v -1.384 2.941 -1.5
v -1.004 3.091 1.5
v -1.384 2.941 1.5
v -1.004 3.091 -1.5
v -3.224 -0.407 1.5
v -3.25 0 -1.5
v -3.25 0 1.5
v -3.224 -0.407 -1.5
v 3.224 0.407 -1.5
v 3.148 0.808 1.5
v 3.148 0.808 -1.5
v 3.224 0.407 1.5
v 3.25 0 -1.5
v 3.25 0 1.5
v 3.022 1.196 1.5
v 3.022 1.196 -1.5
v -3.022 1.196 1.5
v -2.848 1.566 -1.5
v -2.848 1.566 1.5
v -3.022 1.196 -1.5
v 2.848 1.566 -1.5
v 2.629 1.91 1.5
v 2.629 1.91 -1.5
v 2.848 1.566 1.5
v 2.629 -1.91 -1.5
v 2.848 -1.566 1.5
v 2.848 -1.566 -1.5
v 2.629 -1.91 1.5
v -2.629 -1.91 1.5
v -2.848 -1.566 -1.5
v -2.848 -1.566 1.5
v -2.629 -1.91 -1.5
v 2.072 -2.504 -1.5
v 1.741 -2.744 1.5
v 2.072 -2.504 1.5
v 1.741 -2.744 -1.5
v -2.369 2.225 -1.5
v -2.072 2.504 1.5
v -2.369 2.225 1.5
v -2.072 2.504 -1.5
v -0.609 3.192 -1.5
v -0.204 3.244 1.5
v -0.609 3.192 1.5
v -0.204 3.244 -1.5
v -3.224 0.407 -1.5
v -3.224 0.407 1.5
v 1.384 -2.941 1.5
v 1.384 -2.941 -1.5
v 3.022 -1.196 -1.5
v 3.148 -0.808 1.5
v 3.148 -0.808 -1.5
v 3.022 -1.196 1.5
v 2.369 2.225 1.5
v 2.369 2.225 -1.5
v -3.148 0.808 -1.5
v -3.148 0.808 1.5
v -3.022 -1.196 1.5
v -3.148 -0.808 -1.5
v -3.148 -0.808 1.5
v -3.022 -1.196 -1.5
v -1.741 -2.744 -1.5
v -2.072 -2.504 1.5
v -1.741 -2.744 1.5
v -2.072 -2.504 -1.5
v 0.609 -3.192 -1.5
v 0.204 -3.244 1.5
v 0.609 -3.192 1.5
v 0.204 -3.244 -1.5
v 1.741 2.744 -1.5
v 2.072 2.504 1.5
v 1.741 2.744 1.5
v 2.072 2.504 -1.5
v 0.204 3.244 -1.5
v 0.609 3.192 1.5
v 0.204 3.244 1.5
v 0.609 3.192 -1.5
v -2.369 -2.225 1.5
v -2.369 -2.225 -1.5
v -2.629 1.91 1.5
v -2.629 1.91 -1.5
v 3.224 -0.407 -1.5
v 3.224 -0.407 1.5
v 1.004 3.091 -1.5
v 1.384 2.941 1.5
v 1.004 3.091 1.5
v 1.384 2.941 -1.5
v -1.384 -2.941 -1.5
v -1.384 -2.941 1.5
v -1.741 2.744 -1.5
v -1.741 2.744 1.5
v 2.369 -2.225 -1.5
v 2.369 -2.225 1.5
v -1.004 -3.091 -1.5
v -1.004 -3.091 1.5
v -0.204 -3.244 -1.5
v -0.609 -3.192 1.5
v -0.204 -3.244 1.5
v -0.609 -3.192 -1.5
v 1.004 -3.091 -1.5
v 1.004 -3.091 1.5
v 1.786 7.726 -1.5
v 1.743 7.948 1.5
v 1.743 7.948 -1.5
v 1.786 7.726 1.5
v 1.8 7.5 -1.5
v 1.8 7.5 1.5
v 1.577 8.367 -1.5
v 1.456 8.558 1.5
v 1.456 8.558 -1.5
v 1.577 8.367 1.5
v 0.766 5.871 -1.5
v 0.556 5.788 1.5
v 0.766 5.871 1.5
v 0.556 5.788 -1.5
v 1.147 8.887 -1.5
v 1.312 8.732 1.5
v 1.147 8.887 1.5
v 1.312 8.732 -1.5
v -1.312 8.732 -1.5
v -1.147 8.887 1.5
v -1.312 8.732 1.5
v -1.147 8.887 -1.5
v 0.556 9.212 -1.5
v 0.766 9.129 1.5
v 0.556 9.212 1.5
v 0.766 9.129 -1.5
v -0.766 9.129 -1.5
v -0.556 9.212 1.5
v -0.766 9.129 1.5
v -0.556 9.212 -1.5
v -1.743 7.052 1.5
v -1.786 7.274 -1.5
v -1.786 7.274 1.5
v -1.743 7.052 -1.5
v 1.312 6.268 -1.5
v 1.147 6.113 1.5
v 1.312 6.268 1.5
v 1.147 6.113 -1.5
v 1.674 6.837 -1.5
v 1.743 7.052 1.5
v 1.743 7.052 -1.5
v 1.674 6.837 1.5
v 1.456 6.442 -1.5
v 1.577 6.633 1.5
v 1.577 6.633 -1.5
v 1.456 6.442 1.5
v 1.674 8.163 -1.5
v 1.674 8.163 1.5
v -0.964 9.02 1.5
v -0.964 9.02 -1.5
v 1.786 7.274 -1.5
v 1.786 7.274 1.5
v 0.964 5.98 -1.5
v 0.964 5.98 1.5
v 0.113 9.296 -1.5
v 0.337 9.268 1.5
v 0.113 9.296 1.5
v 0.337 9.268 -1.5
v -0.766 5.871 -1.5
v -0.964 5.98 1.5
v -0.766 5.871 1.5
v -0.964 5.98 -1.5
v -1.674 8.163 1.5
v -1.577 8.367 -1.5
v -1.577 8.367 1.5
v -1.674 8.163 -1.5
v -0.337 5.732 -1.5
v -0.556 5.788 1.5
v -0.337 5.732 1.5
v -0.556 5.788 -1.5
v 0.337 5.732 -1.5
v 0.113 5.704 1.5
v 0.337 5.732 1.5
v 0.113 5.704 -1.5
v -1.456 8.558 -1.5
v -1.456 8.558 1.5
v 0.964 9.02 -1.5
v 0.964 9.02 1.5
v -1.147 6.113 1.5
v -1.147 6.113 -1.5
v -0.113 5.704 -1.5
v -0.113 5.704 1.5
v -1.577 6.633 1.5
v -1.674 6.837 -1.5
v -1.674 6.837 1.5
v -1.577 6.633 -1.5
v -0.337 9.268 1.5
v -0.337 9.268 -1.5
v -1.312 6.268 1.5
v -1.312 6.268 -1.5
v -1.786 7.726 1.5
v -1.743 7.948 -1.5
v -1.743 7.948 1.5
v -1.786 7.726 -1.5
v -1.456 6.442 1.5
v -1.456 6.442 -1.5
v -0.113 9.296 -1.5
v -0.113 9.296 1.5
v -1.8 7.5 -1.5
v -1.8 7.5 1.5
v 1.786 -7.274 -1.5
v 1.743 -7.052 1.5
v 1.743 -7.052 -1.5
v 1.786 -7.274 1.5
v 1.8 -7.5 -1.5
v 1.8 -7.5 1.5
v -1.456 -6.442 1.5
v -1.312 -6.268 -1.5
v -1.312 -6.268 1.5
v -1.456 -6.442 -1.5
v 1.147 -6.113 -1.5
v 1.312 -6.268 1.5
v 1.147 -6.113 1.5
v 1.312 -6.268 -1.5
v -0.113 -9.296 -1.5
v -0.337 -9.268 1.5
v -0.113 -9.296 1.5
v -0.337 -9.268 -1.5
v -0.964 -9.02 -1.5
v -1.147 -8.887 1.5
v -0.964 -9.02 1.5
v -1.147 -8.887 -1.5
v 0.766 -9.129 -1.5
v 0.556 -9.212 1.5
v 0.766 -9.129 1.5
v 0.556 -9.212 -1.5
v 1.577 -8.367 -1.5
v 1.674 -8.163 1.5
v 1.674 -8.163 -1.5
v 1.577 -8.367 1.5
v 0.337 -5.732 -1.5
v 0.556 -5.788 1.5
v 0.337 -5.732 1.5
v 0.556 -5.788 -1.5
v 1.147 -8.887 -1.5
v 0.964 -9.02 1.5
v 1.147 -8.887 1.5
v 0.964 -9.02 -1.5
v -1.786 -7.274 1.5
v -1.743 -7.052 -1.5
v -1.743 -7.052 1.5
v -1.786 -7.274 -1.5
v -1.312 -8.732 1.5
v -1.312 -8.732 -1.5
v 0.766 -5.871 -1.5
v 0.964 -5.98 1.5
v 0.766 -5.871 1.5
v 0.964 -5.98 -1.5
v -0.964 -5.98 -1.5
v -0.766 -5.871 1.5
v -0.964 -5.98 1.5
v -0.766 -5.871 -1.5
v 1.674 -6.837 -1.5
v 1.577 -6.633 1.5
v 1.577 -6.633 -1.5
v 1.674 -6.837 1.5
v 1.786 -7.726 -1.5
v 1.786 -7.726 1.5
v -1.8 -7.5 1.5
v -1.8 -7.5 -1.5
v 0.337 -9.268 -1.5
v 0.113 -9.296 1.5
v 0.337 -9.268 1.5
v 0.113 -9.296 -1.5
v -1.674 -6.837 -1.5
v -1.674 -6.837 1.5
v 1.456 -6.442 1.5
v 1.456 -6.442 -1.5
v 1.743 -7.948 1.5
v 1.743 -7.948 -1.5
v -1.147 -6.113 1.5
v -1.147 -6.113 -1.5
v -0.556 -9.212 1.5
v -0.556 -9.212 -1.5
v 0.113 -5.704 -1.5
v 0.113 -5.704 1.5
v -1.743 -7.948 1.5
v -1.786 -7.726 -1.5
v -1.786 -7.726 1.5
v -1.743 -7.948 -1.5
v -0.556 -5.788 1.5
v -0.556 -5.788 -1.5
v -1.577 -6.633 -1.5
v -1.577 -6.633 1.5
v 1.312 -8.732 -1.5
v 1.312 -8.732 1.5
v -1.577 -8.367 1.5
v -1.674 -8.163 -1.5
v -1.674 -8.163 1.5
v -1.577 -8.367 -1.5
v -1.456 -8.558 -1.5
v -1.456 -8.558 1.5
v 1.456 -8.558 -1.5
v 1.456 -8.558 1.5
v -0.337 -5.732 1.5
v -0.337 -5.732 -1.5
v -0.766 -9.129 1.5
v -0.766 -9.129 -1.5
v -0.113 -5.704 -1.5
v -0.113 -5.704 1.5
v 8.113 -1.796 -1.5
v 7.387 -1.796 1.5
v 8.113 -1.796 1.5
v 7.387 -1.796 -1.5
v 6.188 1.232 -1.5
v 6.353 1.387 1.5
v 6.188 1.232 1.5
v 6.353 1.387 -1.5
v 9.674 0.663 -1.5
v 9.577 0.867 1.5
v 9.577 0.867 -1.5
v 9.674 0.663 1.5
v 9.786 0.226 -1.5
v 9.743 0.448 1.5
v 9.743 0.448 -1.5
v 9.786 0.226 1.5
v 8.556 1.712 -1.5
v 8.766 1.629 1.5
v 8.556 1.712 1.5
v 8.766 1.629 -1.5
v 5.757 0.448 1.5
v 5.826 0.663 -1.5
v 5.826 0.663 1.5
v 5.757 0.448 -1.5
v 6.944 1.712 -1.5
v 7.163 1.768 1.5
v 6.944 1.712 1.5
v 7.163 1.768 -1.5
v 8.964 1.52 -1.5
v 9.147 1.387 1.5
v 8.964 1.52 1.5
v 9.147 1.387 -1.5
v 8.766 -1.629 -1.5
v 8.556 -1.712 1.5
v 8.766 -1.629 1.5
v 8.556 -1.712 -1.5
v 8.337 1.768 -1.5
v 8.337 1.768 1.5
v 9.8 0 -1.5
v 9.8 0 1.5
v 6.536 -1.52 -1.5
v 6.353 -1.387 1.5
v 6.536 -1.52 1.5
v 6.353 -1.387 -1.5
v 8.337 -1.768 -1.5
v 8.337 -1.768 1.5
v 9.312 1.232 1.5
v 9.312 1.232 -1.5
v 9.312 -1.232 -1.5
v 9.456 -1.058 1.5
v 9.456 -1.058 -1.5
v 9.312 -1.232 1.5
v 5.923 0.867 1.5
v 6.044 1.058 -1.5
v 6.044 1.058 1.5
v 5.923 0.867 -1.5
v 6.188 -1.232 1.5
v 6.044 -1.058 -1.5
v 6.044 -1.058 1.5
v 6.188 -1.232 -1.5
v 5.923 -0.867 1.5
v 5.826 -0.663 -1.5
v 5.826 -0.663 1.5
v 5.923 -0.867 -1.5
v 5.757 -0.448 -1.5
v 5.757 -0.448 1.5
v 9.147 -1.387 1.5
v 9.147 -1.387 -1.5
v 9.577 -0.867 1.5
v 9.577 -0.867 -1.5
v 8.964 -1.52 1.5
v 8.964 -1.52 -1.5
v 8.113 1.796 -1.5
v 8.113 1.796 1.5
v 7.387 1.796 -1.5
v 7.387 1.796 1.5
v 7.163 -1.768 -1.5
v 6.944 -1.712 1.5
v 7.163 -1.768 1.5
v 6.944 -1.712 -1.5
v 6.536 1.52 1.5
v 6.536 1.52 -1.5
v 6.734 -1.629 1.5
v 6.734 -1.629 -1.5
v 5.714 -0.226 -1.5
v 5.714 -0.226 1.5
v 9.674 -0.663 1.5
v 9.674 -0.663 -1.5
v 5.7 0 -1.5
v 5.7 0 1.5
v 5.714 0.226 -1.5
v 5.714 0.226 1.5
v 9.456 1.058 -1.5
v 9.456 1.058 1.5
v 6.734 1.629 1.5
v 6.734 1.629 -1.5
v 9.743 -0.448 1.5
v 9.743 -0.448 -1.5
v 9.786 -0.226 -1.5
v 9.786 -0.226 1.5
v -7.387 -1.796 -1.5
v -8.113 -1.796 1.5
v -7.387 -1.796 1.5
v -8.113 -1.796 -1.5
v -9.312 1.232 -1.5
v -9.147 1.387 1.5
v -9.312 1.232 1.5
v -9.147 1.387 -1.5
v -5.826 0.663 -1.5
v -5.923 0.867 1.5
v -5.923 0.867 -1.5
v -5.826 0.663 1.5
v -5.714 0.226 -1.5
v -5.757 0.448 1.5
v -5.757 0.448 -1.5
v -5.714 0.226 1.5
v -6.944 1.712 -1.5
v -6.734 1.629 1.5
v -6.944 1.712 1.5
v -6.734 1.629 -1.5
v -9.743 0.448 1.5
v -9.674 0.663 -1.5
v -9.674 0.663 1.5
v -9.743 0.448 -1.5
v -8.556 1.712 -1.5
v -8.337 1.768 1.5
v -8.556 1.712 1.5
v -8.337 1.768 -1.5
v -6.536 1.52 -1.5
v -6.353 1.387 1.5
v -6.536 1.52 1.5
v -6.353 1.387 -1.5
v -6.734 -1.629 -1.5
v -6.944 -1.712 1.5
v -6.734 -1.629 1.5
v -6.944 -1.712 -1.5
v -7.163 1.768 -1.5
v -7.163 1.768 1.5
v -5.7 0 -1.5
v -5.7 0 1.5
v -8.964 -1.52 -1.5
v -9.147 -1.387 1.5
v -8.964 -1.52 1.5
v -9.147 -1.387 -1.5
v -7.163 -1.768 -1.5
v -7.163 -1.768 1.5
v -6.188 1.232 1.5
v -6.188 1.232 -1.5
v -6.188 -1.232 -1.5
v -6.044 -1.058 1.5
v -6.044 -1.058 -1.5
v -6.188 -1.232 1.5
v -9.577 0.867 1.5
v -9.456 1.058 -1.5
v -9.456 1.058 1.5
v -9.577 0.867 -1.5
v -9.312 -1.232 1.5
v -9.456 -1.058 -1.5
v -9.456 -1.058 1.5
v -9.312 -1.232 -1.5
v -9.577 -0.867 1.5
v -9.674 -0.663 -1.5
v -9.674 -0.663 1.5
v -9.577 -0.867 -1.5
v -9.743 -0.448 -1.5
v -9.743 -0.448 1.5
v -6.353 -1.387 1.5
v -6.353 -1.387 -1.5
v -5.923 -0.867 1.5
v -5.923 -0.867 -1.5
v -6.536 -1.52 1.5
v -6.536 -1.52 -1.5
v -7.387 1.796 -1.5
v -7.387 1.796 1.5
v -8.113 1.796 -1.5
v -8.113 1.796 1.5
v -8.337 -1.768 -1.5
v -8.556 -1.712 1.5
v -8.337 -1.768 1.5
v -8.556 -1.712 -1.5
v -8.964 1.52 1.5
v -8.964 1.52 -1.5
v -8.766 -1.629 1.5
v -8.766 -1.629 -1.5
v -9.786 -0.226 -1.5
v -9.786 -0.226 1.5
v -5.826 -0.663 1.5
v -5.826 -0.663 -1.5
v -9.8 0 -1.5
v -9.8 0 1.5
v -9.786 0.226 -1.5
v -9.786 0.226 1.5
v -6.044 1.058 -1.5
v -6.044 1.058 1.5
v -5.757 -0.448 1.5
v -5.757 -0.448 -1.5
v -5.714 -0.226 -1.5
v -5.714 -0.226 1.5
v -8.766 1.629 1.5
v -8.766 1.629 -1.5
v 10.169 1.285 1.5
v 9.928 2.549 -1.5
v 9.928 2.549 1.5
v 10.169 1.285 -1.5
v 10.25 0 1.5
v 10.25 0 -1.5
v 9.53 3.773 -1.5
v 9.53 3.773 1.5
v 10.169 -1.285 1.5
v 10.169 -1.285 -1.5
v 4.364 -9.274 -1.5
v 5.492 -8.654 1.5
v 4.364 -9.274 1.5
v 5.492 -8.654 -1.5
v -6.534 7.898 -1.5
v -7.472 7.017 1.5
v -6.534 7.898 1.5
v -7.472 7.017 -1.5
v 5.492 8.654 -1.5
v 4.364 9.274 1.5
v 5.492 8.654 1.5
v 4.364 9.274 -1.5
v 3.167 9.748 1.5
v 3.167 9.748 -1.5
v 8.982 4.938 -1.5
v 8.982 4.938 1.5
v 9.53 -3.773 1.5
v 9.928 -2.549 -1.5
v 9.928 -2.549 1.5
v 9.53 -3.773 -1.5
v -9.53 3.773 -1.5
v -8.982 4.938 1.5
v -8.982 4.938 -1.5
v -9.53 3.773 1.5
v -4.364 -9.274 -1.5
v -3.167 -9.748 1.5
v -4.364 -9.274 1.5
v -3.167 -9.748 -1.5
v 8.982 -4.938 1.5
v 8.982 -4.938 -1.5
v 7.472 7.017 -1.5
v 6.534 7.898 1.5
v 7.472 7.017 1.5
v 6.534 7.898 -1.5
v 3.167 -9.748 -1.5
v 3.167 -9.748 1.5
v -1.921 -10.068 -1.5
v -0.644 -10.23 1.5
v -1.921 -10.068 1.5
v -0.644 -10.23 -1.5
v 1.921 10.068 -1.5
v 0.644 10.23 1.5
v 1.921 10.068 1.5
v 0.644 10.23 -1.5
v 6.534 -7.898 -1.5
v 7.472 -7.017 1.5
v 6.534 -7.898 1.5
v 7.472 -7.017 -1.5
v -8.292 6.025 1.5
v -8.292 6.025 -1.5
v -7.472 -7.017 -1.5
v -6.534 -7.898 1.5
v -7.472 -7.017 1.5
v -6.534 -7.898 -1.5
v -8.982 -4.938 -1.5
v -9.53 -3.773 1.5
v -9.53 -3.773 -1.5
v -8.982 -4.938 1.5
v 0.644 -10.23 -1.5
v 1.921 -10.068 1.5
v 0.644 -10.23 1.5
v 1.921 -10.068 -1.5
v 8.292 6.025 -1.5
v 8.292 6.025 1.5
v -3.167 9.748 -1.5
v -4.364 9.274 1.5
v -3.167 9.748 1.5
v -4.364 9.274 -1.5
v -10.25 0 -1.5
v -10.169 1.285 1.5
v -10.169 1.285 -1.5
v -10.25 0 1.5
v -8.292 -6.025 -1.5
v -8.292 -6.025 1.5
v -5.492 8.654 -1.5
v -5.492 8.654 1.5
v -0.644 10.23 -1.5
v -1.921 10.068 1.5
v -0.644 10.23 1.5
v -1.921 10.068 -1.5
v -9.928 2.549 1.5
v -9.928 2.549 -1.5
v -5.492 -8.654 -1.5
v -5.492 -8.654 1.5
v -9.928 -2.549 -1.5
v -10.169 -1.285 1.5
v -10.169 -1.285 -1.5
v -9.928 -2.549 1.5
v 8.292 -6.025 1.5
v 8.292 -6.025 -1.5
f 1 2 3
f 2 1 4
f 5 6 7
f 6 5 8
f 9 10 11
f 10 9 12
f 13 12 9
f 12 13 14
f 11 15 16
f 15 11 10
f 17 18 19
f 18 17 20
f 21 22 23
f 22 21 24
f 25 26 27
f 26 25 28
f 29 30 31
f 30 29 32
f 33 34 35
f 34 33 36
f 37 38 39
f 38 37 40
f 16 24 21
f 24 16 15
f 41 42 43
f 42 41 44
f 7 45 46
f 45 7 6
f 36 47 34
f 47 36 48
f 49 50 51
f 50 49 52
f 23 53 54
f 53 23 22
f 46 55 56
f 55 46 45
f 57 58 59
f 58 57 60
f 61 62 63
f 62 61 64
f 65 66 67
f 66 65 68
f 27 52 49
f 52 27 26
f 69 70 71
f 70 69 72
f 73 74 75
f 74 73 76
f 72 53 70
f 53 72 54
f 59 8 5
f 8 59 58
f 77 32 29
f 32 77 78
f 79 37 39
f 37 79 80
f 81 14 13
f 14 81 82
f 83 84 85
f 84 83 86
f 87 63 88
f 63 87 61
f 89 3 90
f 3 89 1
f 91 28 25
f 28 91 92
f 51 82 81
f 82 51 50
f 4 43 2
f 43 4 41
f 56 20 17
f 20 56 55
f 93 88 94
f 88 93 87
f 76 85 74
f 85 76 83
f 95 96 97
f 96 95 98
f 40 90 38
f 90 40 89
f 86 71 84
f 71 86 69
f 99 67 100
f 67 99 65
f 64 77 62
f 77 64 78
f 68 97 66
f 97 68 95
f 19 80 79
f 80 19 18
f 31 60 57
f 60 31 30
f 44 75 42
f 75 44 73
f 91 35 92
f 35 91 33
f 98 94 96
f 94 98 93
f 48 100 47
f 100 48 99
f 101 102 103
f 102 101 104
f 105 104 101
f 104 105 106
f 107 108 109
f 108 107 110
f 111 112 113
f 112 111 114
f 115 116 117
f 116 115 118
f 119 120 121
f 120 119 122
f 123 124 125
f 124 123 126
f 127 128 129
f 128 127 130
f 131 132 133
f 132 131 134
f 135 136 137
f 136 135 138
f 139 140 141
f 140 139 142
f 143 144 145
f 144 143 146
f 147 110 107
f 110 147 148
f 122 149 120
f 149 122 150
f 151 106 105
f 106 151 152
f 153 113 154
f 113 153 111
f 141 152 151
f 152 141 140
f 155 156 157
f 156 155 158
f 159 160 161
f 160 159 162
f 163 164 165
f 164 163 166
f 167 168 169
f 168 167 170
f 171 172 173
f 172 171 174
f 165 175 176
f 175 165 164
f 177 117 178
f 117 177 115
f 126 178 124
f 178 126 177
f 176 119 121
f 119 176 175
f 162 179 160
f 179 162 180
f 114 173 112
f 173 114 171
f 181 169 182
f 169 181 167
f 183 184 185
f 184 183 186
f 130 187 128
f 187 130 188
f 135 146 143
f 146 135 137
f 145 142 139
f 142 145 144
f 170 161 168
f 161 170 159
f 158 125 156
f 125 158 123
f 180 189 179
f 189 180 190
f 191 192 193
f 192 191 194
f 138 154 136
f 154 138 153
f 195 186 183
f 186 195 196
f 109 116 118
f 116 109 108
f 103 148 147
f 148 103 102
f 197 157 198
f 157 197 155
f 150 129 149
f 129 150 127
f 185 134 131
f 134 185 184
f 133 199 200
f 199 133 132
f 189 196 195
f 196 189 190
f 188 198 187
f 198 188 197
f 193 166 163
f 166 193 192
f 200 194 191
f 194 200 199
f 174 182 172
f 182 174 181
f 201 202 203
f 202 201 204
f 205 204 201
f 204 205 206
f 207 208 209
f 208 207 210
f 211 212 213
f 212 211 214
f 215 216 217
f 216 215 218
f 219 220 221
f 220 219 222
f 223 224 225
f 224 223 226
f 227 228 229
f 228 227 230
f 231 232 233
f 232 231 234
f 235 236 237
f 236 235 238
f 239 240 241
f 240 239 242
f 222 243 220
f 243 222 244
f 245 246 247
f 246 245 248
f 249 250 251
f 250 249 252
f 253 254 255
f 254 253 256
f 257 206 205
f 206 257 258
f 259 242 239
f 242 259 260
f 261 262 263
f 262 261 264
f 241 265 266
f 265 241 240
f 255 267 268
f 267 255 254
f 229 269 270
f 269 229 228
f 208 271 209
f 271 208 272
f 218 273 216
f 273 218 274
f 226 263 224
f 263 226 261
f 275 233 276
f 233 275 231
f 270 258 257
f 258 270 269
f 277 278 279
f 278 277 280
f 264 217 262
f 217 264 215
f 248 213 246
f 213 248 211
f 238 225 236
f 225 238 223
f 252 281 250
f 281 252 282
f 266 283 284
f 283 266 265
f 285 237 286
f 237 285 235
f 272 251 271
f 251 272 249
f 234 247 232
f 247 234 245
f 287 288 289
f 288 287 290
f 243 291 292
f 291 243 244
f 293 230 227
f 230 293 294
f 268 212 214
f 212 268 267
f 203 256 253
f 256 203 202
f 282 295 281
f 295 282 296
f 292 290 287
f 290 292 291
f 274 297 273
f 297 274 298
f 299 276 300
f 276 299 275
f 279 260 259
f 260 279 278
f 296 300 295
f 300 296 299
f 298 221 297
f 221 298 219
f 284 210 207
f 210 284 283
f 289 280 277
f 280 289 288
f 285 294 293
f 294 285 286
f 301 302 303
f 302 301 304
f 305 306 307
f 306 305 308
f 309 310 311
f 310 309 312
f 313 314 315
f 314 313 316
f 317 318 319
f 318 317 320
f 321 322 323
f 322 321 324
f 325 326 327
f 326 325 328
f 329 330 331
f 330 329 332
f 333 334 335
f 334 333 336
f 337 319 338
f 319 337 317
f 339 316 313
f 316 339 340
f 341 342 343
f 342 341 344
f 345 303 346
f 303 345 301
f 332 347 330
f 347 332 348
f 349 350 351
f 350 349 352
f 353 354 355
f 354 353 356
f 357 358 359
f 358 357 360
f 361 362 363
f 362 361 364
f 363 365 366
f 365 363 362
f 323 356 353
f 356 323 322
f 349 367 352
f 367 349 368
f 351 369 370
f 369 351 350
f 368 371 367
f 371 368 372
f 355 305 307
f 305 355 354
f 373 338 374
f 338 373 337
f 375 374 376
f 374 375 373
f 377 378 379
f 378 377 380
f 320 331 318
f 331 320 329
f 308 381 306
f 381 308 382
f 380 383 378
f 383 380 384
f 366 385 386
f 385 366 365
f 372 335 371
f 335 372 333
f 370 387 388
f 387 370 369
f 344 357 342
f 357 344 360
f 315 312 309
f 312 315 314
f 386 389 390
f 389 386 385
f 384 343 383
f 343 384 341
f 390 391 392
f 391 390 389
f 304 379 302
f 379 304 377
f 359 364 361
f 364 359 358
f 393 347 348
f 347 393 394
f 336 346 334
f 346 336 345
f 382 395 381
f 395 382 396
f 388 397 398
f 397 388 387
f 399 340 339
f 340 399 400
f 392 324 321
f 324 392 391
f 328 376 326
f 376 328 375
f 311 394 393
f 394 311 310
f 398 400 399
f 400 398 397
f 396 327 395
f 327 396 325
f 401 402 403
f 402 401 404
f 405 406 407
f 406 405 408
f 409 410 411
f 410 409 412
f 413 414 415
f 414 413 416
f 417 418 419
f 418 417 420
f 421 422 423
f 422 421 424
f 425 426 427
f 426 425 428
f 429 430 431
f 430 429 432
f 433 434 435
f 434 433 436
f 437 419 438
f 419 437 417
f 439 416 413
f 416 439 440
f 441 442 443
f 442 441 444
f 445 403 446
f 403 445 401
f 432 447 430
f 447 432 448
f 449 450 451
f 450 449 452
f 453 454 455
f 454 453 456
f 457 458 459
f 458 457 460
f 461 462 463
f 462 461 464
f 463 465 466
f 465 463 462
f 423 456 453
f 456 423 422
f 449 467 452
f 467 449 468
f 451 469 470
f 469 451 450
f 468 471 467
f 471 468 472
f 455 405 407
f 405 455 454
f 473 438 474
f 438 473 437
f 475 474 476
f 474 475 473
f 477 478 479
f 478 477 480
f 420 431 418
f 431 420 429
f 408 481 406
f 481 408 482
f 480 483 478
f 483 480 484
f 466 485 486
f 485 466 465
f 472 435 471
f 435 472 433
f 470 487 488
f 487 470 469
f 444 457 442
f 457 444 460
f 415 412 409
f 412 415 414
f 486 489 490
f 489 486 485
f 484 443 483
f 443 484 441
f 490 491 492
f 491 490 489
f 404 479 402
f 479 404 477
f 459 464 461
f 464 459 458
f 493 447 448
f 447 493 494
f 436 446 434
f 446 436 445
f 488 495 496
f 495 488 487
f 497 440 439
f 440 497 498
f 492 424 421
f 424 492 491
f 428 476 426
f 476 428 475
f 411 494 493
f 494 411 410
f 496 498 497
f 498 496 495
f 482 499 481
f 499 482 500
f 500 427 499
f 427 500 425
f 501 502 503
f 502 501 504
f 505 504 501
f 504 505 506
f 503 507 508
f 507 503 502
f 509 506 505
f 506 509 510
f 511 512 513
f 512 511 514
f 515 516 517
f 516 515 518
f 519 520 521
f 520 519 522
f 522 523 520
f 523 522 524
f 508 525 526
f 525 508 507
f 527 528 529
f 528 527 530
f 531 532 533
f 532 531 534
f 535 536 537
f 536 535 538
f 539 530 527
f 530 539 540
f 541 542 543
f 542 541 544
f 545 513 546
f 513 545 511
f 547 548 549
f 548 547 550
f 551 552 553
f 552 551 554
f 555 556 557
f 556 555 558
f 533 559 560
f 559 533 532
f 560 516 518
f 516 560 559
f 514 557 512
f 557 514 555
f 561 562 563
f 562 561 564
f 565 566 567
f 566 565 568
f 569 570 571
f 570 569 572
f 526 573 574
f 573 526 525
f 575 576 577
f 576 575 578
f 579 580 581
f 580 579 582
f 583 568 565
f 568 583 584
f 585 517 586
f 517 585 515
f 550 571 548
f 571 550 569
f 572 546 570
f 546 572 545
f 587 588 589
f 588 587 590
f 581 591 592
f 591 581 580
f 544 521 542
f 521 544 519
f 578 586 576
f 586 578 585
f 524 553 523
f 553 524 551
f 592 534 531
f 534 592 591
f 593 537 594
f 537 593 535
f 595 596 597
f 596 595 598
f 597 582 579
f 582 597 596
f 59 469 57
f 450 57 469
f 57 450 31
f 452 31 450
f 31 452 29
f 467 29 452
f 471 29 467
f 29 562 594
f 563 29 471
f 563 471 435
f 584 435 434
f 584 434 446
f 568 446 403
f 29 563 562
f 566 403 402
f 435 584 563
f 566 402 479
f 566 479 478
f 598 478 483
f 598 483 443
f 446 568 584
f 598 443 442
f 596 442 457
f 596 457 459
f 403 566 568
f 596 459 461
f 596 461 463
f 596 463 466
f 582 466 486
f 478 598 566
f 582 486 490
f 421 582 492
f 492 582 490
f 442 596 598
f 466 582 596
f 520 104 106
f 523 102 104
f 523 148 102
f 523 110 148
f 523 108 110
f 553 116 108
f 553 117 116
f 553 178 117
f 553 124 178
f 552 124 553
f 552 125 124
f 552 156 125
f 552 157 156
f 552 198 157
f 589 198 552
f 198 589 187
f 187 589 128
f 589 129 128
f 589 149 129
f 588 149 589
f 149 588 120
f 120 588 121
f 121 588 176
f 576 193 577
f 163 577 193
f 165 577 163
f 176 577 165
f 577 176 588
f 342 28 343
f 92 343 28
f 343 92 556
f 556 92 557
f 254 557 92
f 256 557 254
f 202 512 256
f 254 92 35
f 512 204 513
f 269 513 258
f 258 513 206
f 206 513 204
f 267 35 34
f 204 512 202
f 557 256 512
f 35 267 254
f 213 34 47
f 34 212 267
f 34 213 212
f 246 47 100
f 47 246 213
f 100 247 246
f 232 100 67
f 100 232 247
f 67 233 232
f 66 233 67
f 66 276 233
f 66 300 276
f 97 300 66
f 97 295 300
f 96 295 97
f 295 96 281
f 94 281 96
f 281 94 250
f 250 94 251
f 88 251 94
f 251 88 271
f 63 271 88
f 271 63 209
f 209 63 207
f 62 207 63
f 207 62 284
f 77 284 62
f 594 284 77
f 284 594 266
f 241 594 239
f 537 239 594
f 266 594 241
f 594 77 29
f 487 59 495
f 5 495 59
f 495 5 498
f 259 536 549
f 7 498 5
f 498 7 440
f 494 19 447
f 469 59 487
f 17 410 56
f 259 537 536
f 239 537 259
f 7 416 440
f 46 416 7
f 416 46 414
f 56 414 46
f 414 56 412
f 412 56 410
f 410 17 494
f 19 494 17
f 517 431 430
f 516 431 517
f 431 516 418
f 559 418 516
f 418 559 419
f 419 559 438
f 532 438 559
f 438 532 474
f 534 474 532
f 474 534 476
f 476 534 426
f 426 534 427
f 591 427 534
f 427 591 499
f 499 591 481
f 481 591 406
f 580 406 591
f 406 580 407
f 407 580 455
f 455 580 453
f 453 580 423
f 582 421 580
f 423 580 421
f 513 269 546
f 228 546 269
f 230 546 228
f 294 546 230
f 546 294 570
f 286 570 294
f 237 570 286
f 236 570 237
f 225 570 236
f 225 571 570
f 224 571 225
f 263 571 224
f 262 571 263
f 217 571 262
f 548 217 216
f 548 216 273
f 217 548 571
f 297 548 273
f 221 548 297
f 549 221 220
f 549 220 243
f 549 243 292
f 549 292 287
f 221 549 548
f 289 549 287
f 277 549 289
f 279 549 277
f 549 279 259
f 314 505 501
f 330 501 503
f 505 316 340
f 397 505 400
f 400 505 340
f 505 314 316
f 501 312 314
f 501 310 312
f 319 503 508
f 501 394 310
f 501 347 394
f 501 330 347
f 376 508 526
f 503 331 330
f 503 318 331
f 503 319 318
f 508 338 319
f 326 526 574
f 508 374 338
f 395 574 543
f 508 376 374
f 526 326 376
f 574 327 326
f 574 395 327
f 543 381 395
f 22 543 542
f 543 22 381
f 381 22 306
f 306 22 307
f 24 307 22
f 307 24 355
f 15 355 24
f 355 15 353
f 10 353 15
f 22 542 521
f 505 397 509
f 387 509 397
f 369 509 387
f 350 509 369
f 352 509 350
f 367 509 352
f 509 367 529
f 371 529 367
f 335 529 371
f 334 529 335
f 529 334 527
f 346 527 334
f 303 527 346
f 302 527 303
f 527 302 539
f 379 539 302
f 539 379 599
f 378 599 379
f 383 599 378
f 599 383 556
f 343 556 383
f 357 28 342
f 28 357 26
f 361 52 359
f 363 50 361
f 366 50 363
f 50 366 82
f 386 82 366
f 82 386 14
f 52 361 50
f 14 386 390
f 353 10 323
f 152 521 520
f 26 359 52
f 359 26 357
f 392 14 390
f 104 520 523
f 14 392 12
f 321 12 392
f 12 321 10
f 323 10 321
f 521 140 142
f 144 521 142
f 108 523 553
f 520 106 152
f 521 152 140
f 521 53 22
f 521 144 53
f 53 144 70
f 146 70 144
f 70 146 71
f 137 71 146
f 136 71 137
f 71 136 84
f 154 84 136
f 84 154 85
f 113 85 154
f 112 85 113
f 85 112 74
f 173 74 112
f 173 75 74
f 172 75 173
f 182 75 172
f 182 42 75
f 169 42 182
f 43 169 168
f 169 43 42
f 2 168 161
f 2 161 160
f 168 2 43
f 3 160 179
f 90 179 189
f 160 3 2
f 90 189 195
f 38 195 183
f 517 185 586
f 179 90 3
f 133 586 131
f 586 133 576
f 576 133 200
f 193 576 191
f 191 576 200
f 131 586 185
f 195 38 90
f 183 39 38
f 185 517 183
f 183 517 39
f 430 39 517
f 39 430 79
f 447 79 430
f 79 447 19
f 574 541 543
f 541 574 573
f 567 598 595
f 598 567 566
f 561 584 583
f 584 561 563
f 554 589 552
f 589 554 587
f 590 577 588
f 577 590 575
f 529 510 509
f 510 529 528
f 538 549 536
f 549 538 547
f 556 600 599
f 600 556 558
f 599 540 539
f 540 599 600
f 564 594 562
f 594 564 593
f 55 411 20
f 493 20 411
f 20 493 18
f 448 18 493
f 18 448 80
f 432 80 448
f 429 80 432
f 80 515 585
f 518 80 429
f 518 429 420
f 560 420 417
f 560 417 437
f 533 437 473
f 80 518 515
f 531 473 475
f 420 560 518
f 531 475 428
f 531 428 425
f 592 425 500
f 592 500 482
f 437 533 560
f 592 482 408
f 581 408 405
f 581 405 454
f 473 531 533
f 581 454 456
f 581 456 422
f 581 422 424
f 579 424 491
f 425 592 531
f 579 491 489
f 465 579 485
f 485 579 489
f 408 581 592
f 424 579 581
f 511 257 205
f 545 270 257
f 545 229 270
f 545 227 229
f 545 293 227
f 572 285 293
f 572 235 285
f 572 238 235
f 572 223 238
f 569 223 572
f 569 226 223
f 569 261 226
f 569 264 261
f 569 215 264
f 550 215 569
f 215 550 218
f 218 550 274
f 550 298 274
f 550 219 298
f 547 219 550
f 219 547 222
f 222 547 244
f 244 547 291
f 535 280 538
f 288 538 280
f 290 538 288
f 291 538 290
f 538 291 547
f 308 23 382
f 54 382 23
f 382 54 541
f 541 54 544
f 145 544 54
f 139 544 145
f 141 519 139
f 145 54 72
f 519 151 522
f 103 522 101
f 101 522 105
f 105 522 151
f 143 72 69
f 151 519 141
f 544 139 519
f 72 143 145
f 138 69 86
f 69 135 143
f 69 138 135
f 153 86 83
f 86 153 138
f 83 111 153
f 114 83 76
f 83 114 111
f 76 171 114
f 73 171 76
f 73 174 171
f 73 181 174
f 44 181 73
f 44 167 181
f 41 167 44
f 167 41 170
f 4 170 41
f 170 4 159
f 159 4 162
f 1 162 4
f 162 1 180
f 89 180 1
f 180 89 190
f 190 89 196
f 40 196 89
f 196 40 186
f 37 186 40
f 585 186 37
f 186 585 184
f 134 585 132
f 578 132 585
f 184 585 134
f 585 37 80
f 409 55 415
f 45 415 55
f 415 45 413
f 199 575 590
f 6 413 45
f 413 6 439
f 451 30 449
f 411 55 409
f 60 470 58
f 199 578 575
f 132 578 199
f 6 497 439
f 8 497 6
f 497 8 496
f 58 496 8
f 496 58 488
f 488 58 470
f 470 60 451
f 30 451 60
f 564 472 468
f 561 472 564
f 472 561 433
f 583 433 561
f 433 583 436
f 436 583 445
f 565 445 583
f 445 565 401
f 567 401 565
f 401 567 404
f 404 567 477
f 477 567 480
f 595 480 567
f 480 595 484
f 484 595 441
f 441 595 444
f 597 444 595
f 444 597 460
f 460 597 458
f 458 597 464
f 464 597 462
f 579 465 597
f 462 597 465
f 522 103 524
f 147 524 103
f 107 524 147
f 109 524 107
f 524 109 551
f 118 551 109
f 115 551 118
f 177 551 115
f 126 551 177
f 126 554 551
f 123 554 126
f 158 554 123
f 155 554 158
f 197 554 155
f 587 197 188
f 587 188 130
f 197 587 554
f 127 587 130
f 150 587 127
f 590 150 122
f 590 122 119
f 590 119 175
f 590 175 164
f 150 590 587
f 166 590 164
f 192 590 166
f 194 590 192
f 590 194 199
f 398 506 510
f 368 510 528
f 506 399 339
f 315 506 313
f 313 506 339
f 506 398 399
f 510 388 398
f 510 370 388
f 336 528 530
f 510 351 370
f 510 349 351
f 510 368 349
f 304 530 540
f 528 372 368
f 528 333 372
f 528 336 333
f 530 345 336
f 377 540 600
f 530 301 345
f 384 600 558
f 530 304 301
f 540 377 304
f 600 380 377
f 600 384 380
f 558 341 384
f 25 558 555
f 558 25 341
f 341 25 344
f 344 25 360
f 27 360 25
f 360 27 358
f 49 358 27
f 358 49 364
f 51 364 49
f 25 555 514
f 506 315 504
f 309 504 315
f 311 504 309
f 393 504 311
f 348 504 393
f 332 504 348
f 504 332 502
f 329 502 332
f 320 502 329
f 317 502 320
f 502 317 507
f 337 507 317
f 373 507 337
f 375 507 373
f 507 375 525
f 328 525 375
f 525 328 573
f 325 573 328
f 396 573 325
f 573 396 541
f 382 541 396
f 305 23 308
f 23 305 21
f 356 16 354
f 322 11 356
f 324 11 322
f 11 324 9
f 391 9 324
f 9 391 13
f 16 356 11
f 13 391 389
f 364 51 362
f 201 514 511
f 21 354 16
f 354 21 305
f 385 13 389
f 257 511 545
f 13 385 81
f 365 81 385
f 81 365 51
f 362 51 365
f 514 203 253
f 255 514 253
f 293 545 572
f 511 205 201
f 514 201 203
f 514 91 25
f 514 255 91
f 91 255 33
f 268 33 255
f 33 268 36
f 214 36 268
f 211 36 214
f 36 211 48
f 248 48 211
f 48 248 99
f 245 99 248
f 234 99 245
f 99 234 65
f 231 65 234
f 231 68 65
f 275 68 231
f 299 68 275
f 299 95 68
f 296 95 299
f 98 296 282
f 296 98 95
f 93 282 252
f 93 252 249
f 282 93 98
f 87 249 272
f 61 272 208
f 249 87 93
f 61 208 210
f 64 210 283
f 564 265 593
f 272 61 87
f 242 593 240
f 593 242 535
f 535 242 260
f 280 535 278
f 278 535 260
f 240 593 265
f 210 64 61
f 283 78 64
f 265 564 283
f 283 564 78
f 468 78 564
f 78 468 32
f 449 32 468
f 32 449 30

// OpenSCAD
$fn = 50;


difference() {
	union() {
		translate(v = [0, 0, -1.5000000000]) {
			rotate(a = [0, 0, 0]) {
				cylinder(h = 3, r = 10.2500000000);
			}
		}
	}
	union() {
		translate(v = [0.0000000000, 0.0000000000, -125.0000000000]) {
			rotate(a = [0, 0, 0]) {
				cylinder(h = 250, r = 3.2500000000);
			}
		}
		translate(v = [0, 0, -125.0000000000]) {
			rotate(a = [0, 0, 0]) {
				cylinder(h = 250, r = 3.2500000000);
			}
		}
		translate(v = [0, 7.5000000000, -125.0000000000]) {
			rotate(a = [0, 0, 0]) {
				cylinder(h = 250, r = 1.8000000000);
			}
		}
		translate(v = [0, -7.5000000000, -125.0000000000]) {
			rotate(a = [0, 0, 0]) {
				cylinder(h = 250, r = 1.8000000000);
			}
		}
		translate(v = [7.7500000000, 0, -125.0000000000]) {
			rotate(a = [0, 0, 0]) {
				hull() {
					translate(v = [0.2500000000, 0, 0]) {
						rotate(a = [0, 0, 0]) {
							translate(v = [0, 0, 0]) {
								rotate(a = [0, 0, 0]) {
									cylinder(h = 250, r = 1.8000000000);
								}
							}
						}
					}
					translate(v = [-0.2500000000, 0, 0]) {
						rotate(a = [0, 0, 0]) {
							translate(v = [0, 0, 0]) {
								rotate(a = [0, 0, 0]) {
									cylinder(h = 250, r = 1.8000000000);
								}
							}
						}
					}
				}
			}
		}
		translate(v = [-7.7500000000, 0, -125.0000000000]) {
			rotate(a = [0, 0, 0]) {
				hull() {
					translate(v = [0.2500000000, 0, 0]) {
						rotate(a = [0, 0, 0]) {
							translate(v = [0, 0, 0]) {
								rotate(a = [0, 0, 0]) {
									cylinder(h = 250, r = 1.8000000000);
								}
							}
						}
					}
					translate(v = [-0.2500000000, 0, 0]) {
						rotate(a = [0, 0, 0]) {
							translate(v = [0, 0, 0]) {
								rotate(a = [0, 0, 0]) {
									cylinder(h = 250, r = 1.8000000000);
								}
							}
						}
					}
				}
			}
		}
	}
}
